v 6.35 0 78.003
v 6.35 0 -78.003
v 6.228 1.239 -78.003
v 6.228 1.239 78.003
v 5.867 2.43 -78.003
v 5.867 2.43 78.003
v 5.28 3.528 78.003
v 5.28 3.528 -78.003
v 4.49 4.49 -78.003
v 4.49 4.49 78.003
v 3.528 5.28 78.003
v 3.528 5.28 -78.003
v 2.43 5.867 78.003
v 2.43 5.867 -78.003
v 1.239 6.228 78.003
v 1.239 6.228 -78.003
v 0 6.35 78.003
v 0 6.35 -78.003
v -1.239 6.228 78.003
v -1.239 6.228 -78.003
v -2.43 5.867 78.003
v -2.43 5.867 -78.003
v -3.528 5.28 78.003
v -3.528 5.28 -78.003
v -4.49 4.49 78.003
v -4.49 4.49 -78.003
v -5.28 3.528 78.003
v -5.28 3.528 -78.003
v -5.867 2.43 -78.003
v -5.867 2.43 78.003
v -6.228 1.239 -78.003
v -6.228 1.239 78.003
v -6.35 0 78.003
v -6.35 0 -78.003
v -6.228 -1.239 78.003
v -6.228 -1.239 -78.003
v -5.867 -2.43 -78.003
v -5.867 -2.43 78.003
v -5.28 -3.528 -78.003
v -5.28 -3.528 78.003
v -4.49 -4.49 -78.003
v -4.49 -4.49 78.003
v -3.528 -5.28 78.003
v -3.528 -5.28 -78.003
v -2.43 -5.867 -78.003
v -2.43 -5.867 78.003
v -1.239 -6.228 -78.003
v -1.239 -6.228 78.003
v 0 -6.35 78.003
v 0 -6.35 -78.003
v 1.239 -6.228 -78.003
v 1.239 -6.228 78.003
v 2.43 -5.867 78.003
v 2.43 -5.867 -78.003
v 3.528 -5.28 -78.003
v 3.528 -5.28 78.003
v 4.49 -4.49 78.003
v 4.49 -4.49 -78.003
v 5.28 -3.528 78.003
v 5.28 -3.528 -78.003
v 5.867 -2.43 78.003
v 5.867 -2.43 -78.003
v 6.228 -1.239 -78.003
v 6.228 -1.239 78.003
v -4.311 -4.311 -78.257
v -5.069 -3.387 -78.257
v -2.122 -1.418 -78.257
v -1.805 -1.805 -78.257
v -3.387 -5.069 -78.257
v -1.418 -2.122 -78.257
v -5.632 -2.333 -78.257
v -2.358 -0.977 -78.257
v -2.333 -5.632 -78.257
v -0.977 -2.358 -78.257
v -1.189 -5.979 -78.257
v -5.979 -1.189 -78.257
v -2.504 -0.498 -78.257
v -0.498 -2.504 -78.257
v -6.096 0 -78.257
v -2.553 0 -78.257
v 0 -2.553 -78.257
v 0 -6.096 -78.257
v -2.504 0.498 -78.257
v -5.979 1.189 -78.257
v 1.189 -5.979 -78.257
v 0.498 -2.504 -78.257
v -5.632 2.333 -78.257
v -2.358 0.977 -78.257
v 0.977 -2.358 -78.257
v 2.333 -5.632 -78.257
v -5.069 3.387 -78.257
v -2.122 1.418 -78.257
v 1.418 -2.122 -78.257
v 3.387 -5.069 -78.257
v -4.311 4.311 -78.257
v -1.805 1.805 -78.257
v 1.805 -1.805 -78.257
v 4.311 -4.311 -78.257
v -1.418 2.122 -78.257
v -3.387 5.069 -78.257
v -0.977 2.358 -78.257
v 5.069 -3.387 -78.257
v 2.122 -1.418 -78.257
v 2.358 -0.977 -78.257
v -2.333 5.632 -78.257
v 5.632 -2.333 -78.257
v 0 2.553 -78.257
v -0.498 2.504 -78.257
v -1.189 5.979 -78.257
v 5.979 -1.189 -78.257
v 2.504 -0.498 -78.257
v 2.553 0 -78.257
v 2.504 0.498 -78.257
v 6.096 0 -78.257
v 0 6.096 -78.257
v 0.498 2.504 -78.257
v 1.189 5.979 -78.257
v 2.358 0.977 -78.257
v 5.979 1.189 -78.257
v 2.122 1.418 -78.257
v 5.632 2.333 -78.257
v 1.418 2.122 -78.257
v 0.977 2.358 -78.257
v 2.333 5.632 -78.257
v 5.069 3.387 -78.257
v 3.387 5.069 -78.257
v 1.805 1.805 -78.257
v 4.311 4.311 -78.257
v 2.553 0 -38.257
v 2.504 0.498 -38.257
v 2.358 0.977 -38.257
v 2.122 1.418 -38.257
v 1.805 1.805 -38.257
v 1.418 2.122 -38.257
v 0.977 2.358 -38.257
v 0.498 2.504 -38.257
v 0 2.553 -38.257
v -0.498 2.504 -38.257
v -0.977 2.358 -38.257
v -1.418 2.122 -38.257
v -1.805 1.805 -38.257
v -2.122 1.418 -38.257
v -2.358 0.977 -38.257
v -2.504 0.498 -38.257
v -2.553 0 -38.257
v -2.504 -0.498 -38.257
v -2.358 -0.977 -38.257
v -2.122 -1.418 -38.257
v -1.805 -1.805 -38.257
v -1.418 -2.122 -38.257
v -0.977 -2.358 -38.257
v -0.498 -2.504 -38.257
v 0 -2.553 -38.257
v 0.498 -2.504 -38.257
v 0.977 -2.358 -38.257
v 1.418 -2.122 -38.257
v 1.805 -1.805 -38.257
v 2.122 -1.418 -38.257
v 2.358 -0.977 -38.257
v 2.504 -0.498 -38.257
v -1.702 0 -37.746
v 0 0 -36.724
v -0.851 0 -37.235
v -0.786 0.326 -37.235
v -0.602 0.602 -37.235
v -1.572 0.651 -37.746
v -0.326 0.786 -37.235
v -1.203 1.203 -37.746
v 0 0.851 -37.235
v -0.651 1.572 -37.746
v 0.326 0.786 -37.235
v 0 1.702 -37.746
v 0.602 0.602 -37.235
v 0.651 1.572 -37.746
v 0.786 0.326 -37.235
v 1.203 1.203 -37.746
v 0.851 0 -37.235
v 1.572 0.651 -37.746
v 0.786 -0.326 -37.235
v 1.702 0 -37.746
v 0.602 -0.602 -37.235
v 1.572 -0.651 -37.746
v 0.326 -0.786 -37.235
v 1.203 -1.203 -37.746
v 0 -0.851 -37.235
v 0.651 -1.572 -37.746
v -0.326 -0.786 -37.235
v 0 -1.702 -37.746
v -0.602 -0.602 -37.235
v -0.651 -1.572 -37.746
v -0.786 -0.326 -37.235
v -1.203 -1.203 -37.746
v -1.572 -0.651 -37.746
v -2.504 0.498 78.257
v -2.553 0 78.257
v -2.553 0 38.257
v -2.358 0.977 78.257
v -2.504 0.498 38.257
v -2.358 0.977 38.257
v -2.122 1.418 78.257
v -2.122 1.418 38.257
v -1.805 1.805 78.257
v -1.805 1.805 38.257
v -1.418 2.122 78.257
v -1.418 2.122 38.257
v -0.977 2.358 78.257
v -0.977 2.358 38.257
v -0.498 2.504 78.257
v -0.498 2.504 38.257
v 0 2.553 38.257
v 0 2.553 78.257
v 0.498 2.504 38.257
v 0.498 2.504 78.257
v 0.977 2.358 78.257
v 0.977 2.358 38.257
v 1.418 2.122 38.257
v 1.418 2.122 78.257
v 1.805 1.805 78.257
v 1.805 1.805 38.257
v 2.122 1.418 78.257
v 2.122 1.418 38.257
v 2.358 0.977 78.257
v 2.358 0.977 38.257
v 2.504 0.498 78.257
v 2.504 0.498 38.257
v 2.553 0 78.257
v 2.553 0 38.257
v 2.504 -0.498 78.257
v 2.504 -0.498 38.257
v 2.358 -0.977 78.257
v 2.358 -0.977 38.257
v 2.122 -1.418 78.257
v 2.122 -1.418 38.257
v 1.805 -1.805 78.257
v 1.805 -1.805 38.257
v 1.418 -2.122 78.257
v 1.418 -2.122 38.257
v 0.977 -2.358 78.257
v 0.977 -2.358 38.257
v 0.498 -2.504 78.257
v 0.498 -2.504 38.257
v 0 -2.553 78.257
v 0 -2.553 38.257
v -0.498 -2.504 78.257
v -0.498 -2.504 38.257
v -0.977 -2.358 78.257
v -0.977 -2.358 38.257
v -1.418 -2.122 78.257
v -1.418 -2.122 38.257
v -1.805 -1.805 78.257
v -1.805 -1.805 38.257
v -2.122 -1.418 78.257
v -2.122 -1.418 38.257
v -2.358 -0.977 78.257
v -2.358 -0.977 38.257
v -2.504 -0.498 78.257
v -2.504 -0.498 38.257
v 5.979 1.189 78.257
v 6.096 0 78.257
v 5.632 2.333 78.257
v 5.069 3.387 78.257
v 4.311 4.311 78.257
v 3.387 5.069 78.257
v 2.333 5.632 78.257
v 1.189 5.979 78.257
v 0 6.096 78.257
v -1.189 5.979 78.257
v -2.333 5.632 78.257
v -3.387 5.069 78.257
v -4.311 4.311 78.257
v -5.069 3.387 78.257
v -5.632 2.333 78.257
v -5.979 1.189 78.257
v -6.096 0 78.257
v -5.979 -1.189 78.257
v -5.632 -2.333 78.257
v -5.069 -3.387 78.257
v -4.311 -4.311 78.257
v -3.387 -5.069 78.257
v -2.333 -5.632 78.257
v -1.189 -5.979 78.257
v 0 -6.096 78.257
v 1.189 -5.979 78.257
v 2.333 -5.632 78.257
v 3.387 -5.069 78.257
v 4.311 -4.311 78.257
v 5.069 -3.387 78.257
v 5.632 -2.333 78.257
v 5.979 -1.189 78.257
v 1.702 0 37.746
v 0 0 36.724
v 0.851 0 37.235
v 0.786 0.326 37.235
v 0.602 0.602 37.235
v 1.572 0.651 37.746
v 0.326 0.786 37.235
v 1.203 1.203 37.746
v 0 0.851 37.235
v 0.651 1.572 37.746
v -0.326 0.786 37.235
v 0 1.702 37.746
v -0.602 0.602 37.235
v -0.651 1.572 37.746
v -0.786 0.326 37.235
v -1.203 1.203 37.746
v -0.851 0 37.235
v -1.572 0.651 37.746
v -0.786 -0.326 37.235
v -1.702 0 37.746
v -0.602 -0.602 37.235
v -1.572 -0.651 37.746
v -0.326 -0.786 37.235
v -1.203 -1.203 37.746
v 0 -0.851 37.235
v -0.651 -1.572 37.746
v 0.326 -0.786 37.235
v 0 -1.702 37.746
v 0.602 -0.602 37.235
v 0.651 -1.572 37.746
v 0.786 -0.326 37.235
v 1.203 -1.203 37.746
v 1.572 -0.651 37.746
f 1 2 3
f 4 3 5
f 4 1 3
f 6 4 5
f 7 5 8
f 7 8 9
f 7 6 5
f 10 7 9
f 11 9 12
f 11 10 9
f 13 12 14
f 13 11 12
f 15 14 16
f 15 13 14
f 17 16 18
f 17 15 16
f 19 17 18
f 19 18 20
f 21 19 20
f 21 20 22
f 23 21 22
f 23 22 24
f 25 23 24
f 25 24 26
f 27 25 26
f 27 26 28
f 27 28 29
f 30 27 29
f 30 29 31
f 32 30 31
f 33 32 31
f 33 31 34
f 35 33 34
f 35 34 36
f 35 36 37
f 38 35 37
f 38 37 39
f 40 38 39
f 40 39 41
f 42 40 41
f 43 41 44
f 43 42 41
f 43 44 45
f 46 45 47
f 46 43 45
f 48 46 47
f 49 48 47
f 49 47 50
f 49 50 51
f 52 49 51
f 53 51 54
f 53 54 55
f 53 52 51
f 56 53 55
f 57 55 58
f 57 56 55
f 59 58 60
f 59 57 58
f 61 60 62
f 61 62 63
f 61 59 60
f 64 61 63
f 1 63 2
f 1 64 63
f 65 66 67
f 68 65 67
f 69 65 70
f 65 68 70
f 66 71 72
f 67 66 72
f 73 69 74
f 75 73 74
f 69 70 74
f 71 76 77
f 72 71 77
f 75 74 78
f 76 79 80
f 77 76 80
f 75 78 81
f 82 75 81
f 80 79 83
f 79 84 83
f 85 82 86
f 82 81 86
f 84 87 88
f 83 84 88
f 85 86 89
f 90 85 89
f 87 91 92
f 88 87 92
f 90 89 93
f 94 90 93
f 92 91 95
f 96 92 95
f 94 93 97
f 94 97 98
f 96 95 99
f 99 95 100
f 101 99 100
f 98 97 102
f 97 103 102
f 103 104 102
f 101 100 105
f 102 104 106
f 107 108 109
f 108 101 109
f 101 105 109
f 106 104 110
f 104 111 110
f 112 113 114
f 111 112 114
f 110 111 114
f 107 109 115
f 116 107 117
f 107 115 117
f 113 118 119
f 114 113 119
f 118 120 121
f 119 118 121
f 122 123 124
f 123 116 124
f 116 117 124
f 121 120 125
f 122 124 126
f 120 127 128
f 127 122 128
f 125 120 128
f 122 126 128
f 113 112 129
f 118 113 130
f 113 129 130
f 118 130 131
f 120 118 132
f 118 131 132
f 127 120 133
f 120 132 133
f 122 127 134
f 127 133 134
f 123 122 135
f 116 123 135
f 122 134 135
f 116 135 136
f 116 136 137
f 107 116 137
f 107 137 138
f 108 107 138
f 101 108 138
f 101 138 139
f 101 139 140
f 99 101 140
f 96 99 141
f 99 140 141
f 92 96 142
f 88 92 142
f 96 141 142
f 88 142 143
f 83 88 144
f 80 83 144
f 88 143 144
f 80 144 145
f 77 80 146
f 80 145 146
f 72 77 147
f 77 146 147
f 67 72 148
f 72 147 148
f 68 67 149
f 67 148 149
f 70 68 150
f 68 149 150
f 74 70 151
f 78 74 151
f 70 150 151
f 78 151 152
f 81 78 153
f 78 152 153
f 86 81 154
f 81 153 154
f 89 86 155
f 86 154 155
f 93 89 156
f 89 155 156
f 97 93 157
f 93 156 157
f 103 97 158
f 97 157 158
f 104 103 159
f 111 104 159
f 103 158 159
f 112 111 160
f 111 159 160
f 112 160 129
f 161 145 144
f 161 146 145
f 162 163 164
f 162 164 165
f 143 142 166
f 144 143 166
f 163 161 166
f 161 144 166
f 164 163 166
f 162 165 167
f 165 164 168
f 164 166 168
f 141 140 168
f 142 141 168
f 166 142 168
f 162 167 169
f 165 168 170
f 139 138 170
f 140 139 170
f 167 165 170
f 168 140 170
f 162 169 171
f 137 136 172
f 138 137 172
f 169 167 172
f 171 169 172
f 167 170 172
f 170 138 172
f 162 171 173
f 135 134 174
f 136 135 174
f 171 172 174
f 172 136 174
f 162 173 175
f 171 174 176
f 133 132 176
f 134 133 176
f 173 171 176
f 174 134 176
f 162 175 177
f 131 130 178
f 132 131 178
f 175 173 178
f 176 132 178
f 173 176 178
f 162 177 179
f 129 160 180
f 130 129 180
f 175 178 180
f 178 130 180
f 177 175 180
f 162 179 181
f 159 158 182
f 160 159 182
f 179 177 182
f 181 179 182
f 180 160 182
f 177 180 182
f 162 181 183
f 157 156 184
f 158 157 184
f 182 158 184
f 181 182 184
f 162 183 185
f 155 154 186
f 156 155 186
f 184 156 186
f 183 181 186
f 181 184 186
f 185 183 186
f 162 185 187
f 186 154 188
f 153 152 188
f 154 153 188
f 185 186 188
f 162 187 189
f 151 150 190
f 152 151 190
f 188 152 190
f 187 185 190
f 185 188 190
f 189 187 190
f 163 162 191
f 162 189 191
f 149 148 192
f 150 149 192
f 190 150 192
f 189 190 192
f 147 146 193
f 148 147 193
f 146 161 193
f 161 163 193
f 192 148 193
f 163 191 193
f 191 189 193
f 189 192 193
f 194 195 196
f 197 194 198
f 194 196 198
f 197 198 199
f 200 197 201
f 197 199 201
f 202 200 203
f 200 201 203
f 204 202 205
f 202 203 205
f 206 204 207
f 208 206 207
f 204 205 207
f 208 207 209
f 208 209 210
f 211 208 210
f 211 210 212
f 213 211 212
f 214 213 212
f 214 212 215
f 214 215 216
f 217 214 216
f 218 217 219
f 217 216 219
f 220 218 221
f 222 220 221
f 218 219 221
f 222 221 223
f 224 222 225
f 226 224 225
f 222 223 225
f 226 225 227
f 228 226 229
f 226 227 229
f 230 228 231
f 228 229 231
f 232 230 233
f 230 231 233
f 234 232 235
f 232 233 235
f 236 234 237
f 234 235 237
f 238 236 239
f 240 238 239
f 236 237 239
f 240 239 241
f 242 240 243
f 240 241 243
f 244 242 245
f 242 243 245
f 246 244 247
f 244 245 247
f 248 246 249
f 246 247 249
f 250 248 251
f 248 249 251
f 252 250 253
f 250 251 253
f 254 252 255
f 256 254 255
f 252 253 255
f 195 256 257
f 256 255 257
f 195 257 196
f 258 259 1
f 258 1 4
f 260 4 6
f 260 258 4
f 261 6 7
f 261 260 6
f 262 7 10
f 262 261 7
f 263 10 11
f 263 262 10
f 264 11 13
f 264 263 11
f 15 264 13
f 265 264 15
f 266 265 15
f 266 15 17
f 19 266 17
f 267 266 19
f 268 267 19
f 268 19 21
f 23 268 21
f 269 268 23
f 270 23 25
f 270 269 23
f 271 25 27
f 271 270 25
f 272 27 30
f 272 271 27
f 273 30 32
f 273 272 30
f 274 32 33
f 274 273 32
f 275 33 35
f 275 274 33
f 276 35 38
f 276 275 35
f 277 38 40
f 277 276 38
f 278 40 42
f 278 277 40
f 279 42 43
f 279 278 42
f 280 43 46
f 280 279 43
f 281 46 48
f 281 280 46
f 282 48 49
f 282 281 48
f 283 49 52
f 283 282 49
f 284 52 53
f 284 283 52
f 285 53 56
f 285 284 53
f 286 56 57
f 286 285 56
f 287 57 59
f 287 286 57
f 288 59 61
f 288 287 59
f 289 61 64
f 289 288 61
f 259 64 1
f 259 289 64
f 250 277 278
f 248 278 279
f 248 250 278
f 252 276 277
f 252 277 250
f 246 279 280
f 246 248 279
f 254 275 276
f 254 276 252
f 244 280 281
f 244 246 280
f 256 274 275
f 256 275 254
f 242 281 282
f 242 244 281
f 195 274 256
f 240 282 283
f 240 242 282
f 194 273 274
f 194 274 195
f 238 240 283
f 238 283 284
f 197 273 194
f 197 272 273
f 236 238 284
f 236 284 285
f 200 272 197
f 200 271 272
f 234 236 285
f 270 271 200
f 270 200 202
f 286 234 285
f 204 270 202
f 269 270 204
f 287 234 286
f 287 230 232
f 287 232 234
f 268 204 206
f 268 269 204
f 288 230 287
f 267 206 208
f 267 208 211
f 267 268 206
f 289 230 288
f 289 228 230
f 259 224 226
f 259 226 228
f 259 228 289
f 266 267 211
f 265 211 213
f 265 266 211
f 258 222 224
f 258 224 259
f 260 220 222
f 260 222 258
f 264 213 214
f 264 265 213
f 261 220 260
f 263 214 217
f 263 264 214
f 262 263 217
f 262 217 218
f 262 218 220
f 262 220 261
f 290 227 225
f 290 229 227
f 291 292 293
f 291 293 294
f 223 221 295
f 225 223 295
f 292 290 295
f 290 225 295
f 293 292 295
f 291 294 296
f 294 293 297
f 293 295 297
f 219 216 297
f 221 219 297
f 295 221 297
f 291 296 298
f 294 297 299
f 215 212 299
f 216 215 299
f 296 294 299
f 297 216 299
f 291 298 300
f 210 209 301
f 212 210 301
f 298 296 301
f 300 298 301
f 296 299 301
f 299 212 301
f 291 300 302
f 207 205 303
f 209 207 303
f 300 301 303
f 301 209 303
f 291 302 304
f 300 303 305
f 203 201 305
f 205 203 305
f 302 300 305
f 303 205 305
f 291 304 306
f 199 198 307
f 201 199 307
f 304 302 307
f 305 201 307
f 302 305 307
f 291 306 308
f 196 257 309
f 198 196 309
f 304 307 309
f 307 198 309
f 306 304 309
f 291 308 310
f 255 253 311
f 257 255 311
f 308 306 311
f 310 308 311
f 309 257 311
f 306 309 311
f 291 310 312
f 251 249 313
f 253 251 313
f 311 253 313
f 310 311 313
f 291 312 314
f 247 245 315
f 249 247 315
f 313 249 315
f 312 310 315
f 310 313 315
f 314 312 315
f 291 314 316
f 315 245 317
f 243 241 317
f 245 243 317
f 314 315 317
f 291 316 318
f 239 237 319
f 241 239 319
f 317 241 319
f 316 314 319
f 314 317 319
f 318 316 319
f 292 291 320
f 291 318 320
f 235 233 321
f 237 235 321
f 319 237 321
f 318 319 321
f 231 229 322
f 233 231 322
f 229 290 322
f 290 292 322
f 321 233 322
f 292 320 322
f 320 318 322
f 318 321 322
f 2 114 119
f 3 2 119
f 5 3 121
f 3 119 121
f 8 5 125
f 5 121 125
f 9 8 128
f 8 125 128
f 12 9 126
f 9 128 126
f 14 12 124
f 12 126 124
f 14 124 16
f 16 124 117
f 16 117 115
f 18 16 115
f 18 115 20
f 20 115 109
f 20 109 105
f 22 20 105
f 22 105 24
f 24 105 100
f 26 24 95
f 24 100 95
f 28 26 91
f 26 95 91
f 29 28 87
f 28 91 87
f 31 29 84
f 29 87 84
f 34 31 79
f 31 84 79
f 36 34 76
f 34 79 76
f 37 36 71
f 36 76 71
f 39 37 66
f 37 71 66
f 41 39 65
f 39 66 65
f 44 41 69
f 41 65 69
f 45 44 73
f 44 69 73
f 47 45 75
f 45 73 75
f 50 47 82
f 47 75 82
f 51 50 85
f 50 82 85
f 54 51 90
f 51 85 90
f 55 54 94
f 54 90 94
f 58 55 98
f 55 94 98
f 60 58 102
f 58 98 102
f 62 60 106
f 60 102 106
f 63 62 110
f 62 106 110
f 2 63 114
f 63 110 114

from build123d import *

# Parameters (mm, degrees)
SKETCH1_R                   = 6.35
BOSS_EXTRUDE1_DEPTH         = 78.2574
F_1_4_20_TAPPED_HOLE1_D     = 5.1054
F_1_4_20_TAPPED_HOLE1_DEPTH = 40
F_1_4_20_TAPPED_HOLE1_TIP   = 1.533816902
F_1_4_20_TAPPED_HOLE2_D     = 5.1054
F_1_4_20_TAPPED_HOLE2_DEPTH = 40
F_1_4_20_TAPPED_HOLE2_TIP   = 1.533816902
CHAMFER1_SIZE               = 0.254


with BuildPart() as part:
    # Sketch1 → Boss-Extrude1 (new body, symmetric)
    with BuildSketch(Plane.XY):
        Circle(SKETCH1_R)
    extrude(amount=BOSS_EXTRUDE1_DEPTH, both=True)

    # 1/4-20 Tapped Hole1
    with Locations(Plane.XY.offset(78.2574)):
        with Locations((0, 0)):
            Hole(F_1_4_20_TAPPED_HOLE1_D / 2, depth=F_1_4_20_TAPPED_HOLE1_DEPTH)
            with Locations((0, 0, -(F_1_4_20_TAPPED_HOLE1_DEPTH + F_1_4_20_TAPPED_HOLE1_TIP / 2))):  # 118° drill point
                Cone(0, F_1_4_20_TAPPED_HOLE1_D / 2, F_1_4_20_TAPPED_HOLE1_TIP, mode=Mode.SUBTRACT)

    # 1/4-20 Tapped Hole2
    with Locations(Plane(origin=(0, 0, -78.2574), x_dir=(-1, 0, 0), z_dir=(0, 0, -1))):
        with Locations((0, 0)):
            Hole(F_1_4_20_TAPPED_HOLE2_D / 2, depth=F_1_4_20_TAPPED_HOLE2_DEPTH)
            with Locations((0, 0, -(F_1_4_20_TAPPED_HOLE2_DEPTH + F_1_4_20_TAPPED_HOLE2_TIP / 2))):  # 118° drill point
                Cone(0, F_1_4_20_TAPPED_HOLE2_D / 2, F_1_4_20_TAPPED_HOLE2_TIP, mode=Mode.SUBTRACT)

    # Chamfer1
    chamfer1_edges = [part.edges().sort_by_distance(p)[0] for p in [
        (-6.35, 0, -78.2574),
        (-6.35, 0, 78.2574),
    ]]
    chamfer(chamfer1_edges, length=CHAMFER1_SIZE)


solid = part.part
